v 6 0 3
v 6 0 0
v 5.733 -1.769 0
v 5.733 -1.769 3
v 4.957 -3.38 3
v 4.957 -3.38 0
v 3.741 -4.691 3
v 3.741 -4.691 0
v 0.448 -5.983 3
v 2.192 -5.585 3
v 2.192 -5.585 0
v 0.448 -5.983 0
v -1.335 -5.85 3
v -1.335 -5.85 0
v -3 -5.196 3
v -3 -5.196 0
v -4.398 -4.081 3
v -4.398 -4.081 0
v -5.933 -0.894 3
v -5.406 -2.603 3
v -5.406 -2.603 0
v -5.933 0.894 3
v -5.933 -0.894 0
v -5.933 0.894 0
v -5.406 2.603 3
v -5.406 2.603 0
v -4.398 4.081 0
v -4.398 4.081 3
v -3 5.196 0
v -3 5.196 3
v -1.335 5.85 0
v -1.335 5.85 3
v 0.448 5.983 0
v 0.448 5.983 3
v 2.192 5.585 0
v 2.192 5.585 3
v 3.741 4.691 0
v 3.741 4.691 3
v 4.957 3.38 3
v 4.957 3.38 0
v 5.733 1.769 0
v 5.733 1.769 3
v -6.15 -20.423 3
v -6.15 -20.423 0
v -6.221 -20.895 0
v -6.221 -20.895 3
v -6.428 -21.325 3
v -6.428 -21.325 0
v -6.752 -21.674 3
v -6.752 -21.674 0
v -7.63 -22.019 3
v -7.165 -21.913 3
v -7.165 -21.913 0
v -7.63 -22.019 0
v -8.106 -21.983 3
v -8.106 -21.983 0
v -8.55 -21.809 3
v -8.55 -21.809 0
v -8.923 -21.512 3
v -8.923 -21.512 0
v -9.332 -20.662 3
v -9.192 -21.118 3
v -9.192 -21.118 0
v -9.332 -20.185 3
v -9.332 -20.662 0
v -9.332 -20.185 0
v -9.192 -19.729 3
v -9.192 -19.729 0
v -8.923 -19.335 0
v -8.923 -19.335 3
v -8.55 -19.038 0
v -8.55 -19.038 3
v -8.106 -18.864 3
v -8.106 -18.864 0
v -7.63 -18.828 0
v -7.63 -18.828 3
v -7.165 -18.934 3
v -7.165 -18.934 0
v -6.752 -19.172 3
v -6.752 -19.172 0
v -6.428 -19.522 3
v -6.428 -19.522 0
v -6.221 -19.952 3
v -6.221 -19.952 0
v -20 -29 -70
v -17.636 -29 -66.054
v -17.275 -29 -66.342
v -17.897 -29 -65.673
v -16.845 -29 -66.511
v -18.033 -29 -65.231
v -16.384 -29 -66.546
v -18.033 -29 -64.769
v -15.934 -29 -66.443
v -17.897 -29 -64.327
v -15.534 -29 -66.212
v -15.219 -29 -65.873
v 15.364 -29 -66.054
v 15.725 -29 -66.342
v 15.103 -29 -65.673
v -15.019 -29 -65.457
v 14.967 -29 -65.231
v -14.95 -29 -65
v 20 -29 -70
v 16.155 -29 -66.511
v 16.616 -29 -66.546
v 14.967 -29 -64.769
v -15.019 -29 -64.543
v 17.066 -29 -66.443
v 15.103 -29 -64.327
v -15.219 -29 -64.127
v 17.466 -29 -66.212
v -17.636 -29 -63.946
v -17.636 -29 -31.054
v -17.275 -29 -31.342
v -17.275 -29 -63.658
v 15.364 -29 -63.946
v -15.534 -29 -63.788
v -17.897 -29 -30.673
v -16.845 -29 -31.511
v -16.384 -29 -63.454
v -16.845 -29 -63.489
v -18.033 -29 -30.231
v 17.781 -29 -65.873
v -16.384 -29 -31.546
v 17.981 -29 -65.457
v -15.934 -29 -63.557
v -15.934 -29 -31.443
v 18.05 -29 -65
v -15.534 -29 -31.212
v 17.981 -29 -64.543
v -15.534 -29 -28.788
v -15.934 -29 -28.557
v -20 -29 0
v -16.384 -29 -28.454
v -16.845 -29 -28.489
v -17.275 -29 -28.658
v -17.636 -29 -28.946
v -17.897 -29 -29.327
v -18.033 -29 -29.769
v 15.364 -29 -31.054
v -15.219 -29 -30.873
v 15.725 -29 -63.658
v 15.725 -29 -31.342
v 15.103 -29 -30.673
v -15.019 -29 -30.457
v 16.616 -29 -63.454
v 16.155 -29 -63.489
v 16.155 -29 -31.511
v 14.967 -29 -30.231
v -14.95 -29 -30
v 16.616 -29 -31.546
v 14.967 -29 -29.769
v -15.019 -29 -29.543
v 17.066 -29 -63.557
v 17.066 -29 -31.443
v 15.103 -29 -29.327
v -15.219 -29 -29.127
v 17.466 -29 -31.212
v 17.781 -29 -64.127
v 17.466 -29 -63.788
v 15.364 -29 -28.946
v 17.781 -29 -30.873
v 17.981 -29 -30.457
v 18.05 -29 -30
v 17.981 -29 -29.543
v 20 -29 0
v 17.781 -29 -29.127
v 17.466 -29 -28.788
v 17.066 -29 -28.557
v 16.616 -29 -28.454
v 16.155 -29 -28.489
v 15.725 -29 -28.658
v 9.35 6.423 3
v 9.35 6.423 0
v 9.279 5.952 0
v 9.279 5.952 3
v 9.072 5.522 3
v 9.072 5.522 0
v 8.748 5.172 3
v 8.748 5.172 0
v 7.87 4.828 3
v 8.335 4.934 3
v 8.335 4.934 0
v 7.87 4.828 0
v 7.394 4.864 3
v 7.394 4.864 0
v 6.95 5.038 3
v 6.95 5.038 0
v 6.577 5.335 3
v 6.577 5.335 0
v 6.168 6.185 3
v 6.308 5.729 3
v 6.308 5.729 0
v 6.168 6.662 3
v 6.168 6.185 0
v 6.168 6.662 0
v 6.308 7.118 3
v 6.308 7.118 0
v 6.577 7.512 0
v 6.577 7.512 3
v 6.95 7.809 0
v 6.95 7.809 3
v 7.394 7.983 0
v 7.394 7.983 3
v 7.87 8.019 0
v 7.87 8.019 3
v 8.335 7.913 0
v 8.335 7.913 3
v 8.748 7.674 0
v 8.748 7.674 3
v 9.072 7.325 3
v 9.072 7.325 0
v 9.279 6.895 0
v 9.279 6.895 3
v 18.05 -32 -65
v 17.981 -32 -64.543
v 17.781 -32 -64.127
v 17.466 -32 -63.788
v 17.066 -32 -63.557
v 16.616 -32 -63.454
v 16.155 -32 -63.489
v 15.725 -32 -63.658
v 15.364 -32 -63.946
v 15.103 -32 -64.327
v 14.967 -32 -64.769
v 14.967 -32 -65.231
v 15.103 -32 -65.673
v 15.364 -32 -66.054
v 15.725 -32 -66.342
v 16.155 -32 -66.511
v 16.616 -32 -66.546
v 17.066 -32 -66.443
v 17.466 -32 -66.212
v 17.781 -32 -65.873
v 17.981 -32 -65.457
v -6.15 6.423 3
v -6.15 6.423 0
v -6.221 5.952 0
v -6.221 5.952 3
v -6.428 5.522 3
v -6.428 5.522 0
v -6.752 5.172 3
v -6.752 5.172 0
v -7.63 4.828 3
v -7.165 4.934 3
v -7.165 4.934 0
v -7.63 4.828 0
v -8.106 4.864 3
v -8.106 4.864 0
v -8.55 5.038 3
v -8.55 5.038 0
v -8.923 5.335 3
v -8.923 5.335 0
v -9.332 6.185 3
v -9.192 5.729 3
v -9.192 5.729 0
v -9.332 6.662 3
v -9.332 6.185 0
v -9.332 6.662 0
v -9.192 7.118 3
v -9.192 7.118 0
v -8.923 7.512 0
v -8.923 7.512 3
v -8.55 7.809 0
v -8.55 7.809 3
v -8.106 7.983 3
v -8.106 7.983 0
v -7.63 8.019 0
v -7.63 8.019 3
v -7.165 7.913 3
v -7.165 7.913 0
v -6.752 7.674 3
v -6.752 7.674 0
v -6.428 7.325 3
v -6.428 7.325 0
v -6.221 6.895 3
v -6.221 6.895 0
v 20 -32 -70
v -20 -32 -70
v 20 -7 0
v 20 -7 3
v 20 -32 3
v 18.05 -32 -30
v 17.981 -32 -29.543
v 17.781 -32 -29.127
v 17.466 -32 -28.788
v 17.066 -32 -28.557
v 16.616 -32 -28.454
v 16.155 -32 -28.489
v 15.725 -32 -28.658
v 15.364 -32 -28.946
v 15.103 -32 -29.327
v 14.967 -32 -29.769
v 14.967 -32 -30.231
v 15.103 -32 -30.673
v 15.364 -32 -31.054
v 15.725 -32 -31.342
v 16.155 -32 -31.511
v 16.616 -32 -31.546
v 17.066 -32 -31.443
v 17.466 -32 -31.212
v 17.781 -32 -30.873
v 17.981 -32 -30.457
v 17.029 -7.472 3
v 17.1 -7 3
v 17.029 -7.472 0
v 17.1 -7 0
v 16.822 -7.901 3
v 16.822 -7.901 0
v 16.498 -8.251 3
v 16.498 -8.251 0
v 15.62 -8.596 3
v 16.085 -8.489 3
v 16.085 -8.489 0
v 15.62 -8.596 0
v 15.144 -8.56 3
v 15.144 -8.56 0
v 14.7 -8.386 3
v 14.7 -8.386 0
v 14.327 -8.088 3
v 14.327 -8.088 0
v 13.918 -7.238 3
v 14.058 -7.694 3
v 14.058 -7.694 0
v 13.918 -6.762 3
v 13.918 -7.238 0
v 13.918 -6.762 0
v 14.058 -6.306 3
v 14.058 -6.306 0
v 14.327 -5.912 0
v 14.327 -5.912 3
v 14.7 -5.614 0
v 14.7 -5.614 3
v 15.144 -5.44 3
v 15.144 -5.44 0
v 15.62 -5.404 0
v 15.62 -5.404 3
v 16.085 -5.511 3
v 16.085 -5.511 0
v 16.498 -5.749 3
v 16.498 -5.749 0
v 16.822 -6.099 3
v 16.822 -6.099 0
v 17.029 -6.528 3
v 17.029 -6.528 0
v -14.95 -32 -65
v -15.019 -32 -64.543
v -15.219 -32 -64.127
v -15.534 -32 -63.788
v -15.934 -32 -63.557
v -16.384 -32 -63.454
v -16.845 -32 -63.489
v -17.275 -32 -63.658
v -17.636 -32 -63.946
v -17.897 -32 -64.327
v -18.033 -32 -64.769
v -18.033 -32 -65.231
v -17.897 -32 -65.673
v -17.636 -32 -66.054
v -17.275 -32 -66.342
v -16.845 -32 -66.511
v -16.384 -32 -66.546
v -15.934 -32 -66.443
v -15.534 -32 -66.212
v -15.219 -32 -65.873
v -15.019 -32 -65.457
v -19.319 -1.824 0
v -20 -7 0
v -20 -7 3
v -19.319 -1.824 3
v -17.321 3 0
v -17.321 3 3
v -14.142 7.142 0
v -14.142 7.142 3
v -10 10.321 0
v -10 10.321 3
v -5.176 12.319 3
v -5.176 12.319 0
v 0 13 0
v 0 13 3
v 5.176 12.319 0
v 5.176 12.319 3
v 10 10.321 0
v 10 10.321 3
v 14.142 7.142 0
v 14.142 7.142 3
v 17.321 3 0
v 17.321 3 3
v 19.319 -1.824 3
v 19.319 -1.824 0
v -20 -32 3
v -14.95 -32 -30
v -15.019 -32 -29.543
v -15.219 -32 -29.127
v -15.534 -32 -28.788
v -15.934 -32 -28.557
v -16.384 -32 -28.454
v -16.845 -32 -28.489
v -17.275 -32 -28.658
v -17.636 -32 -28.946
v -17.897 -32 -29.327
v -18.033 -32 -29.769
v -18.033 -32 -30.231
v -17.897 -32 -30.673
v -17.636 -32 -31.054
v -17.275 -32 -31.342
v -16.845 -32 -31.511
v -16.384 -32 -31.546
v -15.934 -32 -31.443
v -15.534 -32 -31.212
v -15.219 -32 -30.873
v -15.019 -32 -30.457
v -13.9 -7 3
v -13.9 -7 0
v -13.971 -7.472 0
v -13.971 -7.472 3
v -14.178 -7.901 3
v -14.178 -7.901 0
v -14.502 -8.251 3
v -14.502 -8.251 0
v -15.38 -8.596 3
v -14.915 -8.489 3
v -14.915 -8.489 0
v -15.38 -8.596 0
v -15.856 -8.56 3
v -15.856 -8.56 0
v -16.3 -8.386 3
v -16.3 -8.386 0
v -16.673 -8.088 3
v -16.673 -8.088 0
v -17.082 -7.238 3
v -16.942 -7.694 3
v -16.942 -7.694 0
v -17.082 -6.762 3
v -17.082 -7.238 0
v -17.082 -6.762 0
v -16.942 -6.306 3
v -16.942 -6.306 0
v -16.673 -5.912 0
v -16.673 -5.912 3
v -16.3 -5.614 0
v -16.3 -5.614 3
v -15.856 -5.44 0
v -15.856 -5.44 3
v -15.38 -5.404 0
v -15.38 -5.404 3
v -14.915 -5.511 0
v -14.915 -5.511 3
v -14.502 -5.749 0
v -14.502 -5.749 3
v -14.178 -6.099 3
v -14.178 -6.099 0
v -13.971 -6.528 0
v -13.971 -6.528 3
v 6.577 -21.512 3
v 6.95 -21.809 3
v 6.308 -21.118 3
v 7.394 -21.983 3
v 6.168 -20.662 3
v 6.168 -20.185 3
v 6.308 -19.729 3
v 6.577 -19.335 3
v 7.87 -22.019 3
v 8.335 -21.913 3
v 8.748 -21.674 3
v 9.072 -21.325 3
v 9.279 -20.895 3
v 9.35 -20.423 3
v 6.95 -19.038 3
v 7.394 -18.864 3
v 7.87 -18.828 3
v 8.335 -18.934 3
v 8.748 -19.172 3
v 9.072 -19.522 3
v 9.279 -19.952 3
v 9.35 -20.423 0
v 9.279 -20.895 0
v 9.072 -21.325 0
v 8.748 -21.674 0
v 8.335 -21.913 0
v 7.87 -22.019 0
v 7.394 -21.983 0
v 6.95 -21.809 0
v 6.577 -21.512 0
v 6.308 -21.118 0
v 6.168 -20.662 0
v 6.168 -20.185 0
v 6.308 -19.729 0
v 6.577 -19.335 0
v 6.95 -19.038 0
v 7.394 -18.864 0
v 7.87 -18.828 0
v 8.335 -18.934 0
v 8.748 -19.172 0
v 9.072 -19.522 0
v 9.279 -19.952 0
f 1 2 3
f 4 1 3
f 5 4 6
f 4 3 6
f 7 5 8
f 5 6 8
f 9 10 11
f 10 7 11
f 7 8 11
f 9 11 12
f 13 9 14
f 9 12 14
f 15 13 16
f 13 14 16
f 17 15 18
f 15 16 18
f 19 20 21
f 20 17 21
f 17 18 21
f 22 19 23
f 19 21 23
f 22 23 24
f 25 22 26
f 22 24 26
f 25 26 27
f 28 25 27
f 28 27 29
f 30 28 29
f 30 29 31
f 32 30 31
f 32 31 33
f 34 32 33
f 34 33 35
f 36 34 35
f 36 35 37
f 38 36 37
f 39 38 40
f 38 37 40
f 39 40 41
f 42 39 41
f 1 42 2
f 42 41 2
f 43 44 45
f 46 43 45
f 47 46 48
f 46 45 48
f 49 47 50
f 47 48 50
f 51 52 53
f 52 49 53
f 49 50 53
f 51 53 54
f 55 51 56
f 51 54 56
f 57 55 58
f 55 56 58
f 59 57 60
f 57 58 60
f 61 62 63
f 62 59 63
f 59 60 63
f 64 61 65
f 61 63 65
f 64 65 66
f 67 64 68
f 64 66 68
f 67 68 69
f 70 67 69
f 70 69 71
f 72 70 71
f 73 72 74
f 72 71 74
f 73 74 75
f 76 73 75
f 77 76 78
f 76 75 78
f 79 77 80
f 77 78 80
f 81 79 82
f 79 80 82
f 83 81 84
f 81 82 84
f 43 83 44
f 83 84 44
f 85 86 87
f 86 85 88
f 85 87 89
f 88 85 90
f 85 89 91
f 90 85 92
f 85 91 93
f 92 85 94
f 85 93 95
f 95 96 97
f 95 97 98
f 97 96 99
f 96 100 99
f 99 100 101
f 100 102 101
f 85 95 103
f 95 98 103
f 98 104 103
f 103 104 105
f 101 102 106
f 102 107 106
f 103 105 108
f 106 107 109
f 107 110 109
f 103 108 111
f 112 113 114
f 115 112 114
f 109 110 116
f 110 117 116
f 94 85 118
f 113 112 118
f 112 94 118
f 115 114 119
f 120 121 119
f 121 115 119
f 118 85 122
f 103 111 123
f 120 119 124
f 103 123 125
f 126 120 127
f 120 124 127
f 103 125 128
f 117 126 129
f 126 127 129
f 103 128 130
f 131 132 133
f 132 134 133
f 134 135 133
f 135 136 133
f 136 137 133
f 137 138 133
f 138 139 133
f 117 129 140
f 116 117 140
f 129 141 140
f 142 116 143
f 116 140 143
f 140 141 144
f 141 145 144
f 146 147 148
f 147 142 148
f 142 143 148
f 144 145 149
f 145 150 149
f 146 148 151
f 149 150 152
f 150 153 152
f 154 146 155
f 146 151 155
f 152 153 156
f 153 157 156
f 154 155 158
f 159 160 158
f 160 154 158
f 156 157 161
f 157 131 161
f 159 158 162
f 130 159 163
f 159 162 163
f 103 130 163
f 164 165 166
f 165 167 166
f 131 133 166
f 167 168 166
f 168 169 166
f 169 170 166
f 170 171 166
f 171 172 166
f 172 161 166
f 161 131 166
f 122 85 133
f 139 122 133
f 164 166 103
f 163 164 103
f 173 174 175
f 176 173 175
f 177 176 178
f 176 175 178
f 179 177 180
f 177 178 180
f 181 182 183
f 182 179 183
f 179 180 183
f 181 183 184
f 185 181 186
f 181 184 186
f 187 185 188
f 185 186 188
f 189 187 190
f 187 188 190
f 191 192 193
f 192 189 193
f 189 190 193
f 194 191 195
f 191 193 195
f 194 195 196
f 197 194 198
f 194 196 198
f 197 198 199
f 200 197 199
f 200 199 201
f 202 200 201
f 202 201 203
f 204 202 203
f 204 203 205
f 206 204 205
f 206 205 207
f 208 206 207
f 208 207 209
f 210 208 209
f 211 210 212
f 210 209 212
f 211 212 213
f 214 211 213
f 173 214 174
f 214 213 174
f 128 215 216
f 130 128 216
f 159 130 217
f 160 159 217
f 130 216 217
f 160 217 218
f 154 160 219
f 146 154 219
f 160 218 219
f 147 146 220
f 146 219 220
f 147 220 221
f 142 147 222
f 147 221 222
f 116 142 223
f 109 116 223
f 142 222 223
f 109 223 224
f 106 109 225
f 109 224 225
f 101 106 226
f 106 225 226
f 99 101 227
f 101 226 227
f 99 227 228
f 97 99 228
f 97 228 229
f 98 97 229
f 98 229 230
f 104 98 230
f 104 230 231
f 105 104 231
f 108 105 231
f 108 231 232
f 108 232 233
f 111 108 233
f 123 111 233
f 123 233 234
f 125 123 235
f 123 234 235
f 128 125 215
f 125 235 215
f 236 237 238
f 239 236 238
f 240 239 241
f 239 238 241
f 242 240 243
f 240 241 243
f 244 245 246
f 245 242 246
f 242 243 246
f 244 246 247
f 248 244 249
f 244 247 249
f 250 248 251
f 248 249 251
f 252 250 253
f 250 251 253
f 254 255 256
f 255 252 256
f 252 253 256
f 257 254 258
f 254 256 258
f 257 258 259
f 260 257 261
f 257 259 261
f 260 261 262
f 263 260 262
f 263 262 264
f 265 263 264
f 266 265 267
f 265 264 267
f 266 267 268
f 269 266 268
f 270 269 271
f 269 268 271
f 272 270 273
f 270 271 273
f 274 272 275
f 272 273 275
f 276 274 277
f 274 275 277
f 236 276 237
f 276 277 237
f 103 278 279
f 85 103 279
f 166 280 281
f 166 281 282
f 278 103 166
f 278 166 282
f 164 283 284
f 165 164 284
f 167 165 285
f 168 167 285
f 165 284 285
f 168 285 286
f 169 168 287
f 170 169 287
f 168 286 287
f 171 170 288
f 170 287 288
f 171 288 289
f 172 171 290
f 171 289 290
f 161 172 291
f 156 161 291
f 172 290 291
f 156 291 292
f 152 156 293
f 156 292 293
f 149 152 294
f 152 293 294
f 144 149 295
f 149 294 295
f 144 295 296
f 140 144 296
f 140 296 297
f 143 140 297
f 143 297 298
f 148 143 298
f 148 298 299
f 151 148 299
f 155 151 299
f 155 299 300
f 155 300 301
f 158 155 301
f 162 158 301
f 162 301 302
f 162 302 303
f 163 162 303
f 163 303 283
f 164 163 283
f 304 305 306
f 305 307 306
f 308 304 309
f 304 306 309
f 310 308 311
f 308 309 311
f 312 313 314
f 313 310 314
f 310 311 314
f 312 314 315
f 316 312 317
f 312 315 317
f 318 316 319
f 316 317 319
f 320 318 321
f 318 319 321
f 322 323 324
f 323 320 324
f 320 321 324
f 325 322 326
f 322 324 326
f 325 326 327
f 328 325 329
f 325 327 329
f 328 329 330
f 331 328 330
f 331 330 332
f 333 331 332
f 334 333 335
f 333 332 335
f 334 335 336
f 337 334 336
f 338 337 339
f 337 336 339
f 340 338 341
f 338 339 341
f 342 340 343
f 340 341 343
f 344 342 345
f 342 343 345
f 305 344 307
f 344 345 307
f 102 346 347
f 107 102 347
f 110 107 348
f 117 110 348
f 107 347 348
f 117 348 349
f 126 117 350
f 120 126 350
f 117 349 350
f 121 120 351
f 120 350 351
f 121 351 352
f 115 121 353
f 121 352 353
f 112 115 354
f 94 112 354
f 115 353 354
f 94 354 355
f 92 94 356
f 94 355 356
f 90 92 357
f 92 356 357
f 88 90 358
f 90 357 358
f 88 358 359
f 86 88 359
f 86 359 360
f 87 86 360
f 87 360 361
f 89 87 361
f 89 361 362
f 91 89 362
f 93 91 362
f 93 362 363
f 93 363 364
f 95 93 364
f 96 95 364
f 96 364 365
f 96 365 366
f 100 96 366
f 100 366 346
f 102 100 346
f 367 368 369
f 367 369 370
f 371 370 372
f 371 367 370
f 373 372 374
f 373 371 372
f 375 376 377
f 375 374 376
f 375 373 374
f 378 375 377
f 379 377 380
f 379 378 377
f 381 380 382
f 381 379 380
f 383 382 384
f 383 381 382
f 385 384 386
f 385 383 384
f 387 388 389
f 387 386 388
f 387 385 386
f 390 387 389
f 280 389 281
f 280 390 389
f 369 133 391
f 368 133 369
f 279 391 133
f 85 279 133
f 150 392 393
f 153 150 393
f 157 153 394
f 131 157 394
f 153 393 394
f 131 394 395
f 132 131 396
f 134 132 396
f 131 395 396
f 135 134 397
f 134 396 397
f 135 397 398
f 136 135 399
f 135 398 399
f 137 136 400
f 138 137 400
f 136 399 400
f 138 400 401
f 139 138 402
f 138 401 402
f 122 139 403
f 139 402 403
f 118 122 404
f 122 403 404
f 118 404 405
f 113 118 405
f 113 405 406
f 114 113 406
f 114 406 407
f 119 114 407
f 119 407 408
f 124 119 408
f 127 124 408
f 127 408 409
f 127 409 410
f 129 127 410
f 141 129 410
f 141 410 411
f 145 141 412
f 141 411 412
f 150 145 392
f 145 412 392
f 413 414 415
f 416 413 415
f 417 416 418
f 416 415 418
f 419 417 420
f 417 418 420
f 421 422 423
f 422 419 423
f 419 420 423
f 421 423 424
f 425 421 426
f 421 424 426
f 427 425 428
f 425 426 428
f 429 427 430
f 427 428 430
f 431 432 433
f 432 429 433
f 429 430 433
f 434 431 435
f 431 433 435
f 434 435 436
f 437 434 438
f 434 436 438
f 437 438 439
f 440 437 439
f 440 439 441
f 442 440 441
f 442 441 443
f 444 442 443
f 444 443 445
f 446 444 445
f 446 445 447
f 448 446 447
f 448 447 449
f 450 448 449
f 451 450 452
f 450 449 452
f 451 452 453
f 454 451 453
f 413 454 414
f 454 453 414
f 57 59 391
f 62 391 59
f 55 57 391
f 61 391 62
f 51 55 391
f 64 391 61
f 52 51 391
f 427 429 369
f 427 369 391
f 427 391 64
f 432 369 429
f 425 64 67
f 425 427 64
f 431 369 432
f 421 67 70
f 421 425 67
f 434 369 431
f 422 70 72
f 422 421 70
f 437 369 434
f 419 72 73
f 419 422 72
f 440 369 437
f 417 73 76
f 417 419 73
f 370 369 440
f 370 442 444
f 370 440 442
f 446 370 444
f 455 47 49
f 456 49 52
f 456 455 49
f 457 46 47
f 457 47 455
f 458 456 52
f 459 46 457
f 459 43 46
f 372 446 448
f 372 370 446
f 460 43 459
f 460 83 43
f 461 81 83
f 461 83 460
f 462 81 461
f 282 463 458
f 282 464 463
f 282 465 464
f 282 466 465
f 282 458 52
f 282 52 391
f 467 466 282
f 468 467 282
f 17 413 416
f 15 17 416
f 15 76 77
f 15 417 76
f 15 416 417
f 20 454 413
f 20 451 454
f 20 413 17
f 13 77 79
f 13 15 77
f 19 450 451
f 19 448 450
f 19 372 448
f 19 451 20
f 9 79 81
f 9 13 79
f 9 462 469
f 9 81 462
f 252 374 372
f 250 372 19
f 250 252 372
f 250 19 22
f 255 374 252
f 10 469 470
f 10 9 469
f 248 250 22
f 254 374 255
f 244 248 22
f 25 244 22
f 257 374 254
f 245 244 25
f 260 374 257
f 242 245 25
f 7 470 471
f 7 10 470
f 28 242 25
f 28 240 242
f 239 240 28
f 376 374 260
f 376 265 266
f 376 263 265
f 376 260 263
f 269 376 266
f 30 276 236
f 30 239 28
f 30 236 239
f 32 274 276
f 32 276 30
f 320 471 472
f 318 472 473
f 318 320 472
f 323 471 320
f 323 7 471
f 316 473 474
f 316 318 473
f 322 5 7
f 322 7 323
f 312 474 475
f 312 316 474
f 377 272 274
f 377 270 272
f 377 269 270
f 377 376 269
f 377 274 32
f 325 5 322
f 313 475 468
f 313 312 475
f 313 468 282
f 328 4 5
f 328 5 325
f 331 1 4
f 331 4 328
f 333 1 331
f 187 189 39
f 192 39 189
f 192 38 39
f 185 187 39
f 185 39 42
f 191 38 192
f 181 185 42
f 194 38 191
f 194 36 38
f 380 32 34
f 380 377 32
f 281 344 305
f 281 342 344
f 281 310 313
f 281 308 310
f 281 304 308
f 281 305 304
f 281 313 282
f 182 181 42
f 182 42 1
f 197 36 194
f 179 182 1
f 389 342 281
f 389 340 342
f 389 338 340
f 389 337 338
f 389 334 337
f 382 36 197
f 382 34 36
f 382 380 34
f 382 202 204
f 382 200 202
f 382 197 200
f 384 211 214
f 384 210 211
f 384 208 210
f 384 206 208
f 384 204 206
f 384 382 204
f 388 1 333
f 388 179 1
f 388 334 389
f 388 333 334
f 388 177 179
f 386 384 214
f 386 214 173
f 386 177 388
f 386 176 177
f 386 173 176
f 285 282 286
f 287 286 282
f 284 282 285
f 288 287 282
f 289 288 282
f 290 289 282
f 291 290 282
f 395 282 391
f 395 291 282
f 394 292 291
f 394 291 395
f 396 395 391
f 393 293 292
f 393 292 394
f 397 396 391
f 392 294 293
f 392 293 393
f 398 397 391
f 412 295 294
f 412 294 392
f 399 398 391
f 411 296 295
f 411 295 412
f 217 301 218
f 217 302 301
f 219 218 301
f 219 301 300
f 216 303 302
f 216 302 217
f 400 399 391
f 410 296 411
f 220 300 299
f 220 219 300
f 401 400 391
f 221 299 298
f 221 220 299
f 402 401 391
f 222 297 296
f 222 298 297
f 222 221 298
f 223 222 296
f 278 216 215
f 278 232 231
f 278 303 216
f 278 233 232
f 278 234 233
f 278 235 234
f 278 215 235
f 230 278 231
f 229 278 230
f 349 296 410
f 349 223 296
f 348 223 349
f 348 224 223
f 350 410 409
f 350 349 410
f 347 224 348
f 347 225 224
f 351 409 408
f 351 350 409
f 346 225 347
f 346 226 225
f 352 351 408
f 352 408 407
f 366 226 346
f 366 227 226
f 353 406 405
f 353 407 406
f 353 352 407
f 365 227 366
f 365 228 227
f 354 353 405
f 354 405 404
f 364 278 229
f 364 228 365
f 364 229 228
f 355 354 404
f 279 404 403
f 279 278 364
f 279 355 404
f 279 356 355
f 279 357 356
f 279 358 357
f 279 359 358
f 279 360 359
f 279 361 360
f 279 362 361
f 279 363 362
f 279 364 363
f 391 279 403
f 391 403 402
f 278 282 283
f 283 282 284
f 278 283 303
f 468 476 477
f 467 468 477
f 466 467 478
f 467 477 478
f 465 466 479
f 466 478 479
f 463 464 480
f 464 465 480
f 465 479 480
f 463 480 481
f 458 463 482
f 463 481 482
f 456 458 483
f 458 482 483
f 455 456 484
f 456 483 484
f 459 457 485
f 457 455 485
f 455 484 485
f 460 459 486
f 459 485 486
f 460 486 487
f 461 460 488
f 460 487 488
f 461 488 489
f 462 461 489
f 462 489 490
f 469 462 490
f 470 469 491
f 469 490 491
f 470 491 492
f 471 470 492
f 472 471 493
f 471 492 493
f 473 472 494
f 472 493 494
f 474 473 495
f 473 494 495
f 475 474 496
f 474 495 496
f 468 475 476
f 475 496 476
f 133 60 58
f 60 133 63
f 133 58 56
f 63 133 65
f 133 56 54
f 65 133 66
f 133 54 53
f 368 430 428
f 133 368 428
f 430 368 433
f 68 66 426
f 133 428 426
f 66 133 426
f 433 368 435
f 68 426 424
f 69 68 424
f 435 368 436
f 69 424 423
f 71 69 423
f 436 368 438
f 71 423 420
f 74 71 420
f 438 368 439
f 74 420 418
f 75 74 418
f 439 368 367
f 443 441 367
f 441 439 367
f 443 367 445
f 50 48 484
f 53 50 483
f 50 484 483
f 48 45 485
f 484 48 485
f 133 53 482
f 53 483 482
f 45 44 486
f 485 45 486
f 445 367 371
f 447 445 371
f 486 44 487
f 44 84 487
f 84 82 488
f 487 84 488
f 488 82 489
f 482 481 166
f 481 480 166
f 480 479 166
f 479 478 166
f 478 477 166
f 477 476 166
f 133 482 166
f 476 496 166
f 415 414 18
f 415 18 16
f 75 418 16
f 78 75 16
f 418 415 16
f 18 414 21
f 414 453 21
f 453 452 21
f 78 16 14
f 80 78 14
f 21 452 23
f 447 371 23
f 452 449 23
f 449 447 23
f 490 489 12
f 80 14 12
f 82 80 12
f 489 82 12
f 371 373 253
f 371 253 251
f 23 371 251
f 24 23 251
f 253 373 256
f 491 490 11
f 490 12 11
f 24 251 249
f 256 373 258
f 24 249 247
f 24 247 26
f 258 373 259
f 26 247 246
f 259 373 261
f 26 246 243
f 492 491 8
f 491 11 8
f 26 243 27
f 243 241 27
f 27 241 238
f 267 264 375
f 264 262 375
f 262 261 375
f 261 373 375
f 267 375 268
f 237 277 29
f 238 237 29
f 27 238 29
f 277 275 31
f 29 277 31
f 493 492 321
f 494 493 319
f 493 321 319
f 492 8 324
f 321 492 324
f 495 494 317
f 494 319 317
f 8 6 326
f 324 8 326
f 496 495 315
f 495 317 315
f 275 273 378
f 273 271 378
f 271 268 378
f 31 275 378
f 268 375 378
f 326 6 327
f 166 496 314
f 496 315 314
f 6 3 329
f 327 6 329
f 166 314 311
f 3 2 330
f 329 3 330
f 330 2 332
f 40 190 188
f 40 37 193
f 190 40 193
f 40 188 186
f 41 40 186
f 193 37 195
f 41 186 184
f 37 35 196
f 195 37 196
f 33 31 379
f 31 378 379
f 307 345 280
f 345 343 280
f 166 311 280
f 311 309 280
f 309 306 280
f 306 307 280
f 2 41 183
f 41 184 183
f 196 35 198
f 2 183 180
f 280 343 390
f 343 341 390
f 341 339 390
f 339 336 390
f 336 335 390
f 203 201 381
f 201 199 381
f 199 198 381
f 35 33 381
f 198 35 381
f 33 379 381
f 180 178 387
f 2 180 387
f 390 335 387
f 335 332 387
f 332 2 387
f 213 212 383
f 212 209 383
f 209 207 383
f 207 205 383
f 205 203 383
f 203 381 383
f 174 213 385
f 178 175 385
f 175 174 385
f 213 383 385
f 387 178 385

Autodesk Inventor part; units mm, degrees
ref_plane "YZ Plane" through (0, 0, 0) normal (1, 0, 0) x (0, 1, 0)
ref_plane "XZ Plane" through (0, 0, 0) normal (0, 1, 0) x (-1, 0, 0)
ref_plane "XY Plane" through (0, 0, 0) normal (0, 0, 1) x (1, 0, 0)
sketch "Sketch1" plane through (0, 0, 0) normal (0, 0, 1) x (1, 0, 0)
  circle A0 centre (15.5, -7) radius 1.6
  circle A1 centre (7.75, -20.4234) radius 1.6
  circle A2 centre (-7.75, -20.4234) radius 1.6
  circle A3 centre (-15.5, -7) radius 1.6
  circle A4 centre (7.75, 6.4234) radius 1.6
  circle A5 centre (-7.75, 6.4234) radius 1.6
  circle A6 centre (0, 0) radius 6
  arc A7 (20, -7) -> (-20, -7) centre (0, -7) ccw
  line L0 (20, -7) -> (20, -32)
  line L1 (20, -32) -> (-20, -32)
  line L2 (-20, -32) -> (-20, -7)
  dimension "d0" = 40
  dimension "d1" = 25
extrude "Extrusion1" add sketch "Sketch1" along normal blind 3
sketch "Sketch2" plane through (-20, -32, 0) normal (0, -1, 0) x (1, 0, 0)
  line L0 (0, 0) -> (0, 3) projected
  line L1 (0, 3) -> (40, 3)
  line L2 (40, 3) -> (40, -70)
  line L3 (40, -70) -> (0, -70)
  line L4 (0, -70) -> (0, 3)
  line L5 (0, -70) -> (40, -70)
  line L6 (40, -70) -> (40, -25)
  line L7 (40, -25) -> (0, -25) construction
  line L8 (0, -25) -> (0, -70)
  line L9 (40, -25) -> (0, -70) construction
  line L10 (36.5, -30) -> (3.5, -30) construction
  line L11 (3.5, -30) -> (3.5, -65) construction
  line L12 (3.5, -65) -> (36.5, -65) construction
  line L13 (36.5, -65) -> (36.5, -30) construction
  line L14 (36.5, -30) -> (3.5, -65) construction
  line L15 (3.5, -30) -> (36.5, -65) construction
  circle A0 centre (36.5, -30) radius 1.55
  circle A1 centre (36.5, -65) radius 1.55
  circle A2 centre (3.5, -30) radius 1.55
  circle A3 centre (3.5, -65) radius 1.55
  point P0 (20, 0)
  point P1 (20, -47.5)
  dimension "d4" = 73
  dimension "d5" = 45
  dimension "d6" = 33
  dimension "d7" = 35
  dimension "d8" = 3.1
  dimension "d11" = 35
  dimension "d14" = 33
extrude "Extrusion2" add sketch "Sketch2" against normal blind 3
properties part number "Push_motor_fix"
